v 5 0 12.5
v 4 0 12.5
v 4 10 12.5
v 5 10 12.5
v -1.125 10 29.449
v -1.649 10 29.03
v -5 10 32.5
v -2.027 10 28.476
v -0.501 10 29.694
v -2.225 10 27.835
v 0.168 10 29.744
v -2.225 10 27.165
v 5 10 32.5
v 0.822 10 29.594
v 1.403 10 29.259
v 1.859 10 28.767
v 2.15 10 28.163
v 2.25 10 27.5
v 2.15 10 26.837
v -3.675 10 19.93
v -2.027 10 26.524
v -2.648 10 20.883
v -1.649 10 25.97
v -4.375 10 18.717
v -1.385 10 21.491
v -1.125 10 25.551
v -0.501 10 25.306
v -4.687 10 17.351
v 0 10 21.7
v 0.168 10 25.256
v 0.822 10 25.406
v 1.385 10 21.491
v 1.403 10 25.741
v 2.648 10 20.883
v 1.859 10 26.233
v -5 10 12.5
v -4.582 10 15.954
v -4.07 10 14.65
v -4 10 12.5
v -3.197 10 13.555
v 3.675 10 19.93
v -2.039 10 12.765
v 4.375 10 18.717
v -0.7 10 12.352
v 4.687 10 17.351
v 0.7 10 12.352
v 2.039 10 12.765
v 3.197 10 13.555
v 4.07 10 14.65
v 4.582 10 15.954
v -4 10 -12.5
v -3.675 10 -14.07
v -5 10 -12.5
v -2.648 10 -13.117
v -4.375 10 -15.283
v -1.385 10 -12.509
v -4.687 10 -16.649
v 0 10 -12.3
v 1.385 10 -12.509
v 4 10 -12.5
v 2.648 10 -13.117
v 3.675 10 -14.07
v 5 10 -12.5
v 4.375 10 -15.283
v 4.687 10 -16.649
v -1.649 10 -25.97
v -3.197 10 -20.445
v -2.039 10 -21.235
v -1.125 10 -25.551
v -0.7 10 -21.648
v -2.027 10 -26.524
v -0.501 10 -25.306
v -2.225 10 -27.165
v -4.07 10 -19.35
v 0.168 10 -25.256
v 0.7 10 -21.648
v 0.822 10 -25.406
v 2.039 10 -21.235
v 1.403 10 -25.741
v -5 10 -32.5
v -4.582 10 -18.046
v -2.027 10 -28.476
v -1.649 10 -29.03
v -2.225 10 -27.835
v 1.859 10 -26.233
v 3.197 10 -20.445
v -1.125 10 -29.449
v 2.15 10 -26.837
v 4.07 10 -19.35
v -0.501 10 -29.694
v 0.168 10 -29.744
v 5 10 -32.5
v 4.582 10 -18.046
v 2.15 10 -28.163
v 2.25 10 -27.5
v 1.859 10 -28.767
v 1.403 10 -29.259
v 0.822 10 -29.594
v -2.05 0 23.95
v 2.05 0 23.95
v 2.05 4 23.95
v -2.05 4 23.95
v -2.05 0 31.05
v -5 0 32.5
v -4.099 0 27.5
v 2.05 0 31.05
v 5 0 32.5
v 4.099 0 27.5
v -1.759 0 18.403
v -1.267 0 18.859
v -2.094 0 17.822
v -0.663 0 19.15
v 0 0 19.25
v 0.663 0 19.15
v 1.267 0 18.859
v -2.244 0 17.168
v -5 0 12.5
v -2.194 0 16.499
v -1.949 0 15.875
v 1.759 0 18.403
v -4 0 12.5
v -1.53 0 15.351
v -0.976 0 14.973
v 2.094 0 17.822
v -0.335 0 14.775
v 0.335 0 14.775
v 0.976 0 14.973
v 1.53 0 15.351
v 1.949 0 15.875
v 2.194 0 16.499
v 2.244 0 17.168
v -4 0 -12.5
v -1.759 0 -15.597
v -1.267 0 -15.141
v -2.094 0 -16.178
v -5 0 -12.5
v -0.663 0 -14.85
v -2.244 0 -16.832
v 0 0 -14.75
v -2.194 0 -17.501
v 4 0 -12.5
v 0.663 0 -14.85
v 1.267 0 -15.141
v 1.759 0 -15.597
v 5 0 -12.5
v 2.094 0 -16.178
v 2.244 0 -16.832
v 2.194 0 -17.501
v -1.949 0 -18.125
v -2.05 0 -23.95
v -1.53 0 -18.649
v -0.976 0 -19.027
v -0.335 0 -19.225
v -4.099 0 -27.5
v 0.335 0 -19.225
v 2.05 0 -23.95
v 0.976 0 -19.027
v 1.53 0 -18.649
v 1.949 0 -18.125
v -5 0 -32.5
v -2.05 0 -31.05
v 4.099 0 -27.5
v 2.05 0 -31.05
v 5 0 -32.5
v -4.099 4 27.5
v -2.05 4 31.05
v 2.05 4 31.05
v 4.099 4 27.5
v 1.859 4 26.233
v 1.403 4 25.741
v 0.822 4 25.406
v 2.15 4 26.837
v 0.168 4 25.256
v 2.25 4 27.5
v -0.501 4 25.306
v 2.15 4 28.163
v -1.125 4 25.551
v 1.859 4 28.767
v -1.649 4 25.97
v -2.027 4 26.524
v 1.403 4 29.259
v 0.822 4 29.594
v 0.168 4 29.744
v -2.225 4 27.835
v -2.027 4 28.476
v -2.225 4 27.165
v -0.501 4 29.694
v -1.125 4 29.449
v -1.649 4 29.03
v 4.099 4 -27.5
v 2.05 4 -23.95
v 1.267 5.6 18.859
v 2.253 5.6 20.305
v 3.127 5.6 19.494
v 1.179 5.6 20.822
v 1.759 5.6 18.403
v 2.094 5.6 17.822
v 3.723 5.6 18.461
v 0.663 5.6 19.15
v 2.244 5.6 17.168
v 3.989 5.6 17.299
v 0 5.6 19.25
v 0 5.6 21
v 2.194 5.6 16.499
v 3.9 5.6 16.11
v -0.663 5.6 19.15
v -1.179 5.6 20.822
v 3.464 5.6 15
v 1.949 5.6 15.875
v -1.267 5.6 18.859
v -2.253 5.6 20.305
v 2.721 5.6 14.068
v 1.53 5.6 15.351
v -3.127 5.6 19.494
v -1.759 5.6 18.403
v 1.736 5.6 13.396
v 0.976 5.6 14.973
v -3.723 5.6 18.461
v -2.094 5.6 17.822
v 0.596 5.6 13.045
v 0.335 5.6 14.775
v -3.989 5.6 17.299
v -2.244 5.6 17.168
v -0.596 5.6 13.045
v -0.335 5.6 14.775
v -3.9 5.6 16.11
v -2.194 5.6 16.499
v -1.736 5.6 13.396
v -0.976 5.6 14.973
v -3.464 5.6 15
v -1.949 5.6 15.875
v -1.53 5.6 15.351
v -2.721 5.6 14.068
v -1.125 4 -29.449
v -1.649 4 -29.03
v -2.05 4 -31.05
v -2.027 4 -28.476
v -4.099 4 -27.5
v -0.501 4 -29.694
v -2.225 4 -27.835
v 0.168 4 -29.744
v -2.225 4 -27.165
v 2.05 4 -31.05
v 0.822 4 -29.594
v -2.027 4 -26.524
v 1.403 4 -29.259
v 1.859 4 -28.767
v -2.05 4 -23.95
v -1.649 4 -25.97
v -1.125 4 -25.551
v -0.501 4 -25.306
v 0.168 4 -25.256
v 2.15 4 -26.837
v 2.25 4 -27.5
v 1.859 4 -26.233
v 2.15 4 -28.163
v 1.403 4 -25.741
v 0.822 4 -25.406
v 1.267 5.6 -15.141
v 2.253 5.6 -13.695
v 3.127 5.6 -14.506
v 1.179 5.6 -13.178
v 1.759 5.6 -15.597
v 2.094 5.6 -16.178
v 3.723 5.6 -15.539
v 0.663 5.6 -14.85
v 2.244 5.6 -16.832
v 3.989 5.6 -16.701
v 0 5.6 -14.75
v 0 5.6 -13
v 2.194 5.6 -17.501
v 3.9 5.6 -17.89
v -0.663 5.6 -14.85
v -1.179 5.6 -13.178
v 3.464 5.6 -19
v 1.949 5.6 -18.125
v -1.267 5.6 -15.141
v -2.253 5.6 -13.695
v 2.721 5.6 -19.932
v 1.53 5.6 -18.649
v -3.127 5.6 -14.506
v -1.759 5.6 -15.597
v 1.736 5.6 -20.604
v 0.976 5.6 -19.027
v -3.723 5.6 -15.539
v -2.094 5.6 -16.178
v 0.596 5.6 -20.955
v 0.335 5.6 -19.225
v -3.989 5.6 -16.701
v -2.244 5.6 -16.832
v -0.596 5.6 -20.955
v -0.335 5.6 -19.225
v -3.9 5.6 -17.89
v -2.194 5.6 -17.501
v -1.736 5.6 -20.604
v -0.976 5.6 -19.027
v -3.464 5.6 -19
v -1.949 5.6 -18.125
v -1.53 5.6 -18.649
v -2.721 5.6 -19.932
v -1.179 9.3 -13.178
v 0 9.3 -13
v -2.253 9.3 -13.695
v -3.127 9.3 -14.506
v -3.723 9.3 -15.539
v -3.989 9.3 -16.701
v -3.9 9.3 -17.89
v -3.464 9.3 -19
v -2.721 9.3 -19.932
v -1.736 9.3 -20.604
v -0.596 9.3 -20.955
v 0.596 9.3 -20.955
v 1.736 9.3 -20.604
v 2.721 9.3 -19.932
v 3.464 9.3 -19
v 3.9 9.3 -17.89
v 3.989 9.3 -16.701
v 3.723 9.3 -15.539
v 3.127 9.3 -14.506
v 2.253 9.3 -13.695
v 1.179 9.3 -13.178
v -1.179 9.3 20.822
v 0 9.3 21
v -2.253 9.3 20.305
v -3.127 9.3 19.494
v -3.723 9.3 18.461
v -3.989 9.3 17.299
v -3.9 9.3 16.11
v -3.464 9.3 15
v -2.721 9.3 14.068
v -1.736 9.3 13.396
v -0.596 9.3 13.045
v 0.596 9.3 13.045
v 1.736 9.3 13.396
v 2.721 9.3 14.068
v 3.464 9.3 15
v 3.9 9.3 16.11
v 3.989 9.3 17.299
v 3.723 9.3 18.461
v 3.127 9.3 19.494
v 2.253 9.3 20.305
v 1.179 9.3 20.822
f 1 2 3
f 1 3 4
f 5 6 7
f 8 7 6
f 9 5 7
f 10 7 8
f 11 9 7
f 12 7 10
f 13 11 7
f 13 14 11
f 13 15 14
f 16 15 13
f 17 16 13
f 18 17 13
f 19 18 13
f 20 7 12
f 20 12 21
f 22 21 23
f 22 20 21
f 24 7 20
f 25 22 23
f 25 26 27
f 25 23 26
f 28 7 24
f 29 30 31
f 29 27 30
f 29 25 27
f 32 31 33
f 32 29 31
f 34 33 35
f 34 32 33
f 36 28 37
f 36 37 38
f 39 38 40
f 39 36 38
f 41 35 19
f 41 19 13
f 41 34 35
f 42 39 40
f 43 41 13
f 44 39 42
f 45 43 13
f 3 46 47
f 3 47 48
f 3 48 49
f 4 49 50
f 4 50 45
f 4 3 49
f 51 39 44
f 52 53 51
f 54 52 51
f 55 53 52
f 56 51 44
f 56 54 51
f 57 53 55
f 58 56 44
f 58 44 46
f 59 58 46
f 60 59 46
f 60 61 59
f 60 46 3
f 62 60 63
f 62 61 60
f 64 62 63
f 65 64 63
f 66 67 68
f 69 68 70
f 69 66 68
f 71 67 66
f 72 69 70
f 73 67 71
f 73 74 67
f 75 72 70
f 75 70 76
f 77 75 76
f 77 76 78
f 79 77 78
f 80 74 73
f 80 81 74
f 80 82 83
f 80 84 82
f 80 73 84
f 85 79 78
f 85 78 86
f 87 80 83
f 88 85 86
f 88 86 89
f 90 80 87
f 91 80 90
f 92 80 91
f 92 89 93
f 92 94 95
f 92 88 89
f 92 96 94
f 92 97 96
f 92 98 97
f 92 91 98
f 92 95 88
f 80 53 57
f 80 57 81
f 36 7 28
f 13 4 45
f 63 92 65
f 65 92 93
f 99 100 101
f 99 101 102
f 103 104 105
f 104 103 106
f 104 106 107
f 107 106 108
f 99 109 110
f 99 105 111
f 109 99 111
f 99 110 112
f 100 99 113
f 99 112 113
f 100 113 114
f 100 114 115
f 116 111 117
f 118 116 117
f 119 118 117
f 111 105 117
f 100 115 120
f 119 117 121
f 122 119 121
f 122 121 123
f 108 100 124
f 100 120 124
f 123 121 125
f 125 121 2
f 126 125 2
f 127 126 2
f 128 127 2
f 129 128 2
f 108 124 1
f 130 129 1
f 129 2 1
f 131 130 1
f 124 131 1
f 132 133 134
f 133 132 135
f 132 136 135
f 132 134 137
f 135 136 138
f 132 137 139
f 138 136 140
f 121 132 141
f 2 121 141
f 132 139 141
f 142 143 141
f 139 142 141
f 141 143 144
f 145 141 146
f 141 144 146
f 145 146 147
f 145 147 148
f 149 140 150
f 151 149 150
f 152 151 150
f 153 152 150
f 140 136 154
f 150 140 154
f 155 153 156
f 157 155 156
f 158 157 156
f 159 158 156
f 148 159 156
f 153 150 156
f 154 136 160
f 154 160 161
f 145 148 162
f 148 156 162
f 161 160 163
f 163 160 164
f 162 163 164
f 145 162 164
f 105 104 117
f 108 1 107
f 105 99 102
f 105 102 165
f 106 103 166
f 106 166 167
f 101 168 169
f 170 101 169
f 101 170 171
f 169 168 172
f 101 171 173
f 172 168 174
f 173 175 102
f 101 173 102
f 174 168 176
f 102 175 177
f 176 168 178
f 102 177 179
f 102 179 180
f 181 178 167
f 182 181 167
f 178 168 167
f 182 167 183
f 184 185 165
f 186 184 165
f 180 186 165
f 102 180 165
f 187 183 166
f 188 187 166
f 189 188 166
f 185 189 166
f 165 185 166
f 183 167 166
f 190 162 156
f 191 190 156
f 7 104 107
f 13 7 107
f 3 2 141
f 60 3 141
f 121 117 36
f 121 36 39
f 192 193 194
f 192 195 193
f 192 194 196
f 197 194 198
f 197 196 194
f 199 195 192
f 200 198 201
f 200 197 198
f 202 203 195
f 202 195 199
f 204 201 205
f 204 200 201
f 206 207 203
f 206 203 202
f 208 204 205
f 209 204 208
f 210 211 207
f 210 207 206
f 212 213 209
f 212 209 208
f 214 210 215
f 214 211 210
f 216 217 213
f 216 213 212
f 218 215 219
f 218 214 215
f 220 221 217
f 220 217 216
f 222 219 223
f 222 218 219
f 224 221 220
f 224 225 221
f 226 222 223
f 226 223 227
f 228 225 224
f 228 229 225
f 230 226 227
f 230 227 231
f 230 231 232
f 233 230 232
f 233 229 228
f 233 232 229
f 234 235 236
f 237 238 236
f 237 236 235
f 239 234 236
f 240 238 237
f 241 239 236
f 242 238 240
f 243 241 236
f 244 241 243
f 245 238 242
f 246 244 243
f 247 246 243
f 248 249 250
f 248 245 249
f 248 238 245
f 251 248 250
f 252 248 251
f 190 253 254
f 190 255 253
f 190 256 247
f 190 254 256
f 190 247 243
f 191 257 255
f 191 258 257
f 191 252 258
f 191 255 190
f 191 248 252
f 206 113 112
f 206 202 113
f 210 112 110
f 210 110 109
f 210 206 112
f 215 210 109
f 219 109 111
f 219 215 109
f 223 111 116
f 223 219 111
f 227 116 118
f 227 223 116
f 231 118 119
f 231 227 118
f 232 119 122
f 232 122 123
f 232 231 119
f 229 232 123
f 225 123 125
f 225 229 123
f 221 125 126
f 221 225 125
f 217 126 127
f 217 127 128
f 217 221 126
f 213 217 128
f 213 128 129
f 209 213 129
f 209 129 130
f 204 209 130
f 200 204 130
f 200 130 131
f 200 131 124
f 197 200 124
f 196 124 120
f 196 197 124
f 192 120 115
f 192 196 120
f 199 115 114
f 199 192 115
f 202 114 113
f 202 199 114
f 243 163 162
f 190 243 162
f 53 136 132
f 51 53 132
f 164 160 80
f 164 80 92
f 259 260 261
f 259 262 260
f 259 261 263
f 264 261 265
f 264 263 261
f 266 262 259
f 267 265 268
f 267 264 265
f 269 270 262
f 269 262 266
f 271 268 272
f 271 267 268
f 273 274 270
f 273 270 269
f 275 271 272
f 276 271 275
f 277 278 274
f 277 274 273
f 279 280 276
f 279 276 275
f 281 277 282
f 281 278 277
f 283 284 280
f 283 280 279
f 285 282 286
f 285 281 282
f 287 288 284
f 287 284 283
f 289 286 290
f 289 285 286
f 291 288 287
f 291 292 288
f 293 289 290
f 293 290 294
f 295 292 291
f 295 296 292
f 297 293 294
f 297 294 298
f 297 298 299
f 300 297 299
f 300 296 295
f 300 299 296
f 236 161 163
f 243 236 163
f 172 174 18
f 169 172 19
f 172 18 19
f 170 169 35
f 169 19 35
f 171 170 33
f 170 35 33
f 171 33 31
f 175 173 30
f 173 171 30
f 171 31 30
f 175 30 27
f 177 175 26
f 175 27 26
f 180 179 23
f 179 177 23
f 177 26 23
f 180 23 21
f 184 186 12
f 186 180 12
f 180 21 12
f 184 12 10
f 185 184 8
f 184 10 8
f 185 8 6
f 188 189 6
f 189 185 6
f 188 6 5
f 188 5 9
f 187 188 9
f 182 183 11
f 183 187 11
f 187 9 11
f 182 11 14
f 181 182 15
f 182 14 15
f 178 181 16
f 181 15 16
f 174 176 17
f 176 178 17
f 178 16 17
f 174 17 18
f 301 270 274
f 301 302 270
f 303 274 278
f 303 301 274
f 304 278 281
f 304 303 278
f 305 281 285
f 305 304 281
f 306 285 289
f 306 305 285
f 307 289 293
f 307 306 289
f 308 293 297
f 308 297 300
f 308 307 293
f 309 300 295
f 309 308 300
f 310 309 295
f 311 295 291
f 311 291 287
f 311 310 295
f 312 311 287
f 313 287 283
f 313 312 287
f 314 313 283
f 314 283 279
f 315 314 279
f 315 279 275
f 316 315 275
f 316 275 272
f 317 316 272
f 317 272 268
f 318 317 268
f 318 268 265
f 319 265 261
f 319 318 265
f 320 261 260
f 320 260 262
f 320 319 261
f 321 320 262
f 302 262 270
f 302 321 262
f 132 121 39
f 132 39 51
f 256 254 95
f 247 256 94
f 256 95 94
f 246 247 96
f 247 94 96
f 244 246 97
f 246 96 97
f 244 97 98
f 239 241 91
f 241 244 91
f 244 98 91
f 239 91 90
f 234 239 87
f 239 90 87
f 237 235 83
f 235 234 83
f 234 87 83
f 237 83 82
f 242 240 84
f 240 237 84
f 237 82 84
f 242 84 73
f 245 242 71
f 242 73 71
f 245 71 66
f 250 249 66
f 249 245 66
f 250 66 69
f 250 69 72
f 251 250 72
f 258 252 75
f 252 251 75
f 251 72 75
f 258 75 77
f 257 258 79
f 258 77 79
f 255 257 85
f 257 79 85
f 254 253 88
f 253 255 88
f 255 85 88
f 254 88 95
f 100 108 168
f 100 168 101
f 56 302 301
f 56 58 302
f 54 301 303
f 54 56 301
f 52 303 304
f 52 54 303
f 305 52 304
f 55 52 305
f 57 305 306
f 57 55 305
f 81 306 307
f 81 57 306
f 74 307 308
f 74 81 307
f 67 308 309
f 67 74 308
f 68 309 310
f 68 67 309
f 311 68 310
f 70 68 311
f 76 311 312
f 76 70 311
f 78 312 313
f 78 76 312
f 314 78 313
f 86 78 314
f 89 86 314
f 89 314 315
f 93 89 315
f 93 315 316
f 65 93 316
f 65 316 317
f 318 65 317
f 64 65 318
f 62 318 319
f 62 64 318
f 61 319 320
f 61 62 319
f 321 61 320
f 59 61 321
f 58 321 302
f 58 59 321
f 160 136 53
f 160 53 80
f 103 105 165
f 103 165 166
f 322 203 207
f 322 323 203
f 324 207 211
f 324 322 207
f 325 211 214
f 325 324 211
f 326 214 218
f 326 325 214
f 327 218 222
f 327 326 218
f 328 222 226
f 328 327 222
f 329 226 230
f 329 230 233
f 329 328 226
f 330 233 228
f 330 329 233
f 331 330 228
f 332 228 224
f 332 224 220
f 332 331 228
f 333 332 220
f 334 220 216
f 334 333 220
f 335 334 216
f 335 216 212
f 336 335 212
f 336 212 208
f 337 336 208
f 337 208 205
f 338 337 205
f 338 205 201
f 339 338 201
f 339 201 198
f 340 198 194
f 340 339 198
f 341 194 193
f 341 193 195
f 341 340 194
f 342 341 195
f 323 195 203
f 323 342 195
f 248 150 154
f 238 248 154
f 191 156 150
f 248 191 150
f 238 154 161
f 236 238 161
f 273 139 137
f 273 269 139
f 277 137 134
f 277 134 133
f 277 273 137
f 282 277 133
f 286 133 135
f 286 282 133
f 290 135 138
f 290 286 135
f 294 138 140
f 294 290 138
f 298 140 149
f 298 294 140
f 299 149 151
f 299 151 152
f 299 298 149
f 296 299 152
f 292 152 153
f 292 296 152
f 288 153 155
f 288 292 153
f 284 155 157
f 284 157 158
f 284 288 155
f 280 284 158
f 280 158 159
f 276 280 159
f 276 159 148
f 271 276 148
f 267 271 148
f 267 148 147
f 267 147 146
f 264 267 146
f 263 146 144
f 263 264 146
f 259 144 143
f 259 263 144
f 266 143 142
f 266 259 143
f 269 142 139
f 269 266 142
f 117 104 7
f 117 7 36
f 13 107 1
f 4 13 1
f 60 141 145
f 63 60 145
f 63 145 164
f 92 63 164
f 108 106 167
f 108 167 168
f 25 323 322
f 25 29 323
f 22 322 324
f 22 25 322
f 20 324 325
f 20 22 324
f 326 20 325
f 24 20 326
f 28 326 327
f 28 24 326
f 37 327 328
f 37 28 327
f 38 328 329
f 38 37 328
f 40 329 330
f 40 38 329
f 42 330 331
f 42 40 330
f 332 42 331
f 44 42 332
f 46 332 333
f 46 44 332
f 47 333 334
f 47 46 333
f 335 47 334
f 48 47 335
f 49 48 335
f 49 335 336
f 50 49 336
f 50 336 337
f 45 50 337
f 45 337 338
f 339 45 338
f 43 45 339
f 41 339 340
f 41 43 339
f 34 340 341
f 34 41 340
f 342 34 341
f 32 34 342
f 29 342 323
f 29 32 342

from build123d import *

# Parameters (mm, degrees)
SKETCH_1_W                  = 10
SKETCH_1_H                  = 20
SKETCH_1_W_2                = 8
SKETCH_1_H_2                = 25
EXTRUDE_1_DEPTH             = 10
HOLE_WIZARD_M4_1_AT_2_COUNT = 2
HOLE_WIZARD_M4_1_AT_2_PITCH = 34
HOLE_WIZARD_M4_1_2_D        = 4.5
HOLE_WIZARD_M4_1_2_DEPTH    = 10
SKETCH_7_R                  = 2.25
CUT_EXTRUDE_1_DEPTH         = 4


with BuildPart() as part:
    # 스케치1 → 보스-돌출1 (new body)
    with BuildSketch(Plane(origin=(0, 0, 0), x_dir=(1, 0, 0), z_dir=(0, 1, 0))):
        with Locations((0, 22.5)):
            Rectangle(SKETCH_1_W, SKETCH_1_H)
        Rectangle(SKETCH_1_W_2, SKETCH_1_H_2)
        with Locations((0, -22.5)):
            Rectangle(SKETCH_1_W, SKETCH_1_H)
    extrude(amount=EXTRUDE_1_DEPTH)

    # 스케치3 → Hole Wizard M4 _ _ _ _ _ _1 (revolve, cut)
    with BuildSketch(Plane(origin=(0, 10, -17), x_dir=(0, 0, 1), z_dir=(1, 0, 0))):
        Polygon((0, 0), (0, 10), (2.25, 10), (2.25, 4.4), (4, 4.4), (4, 0.7), (4.7, 0), align=None)
    hole_wizard_m4_1 = revolve(axis=Axis((0, 16.35, -17), (0, -1, 0)), mode=Mode.SUBTRACT)

    # Hole Wizard M4 _ _ _ _ _ _1 at 2: Hole Wizard M4 _ _ _ _ _ _1 ×2
    with Locations(*[(0, 0, i * HOLE_WIZARD_M4_1_AT_2_PITCH) for i in range(1, HOLE_WIZARD_M4_1_AT_2_COUNT)]):
        add(hole_wizard_m4_1, mode=Mode.SUBTRACT)

    # Hole Wizard M4 _ _1 2
    with Locations(Plane(origin=(0, 0, 0), x_dir=(-1, 0, 0), z_dir=(0, -1, 0))):
        with Locations((0, -27.5), (0, 27.5), (54.10839937, -109.42081154)):
            Hole(HOLE_WIZARD_M4_1_2_D / 2, depth=HOLE_WIZARD_M4_1_2_DEPTH)

    # 스케치7 → 컷-돌출1 (cut)
    with BuildSketch(Plane.XZ):
        Polygon((2.049593456, -31.05), (4.099186911, -27.5), (2.049593456, -23.95), (-2.049593456, -23.95), (-4.099186911, -27.5), (-2.049593456, -31.05), align=None)
        with Locations((0, -27.5)):
            Circle(SKETCH_7_R, mode=Mode.SUBTRACT)
        Polygon((2.049593456, 23.95), (-2.049593456, 23.95), (-4.099186911, 27.5), (-2.049593456, 31.05), (2.049593456, 31.05), (4.099186911, 27.5), align=None)
        with Locations((0, 27.5)):
            Circle(SKETCH_7_R, mode=Mode.SUBTRACT)
    extrude(amount=-CUT_EXTRUDE_1_DEPTH, mode=Mode.SUBTRACT)


solid = part.part
